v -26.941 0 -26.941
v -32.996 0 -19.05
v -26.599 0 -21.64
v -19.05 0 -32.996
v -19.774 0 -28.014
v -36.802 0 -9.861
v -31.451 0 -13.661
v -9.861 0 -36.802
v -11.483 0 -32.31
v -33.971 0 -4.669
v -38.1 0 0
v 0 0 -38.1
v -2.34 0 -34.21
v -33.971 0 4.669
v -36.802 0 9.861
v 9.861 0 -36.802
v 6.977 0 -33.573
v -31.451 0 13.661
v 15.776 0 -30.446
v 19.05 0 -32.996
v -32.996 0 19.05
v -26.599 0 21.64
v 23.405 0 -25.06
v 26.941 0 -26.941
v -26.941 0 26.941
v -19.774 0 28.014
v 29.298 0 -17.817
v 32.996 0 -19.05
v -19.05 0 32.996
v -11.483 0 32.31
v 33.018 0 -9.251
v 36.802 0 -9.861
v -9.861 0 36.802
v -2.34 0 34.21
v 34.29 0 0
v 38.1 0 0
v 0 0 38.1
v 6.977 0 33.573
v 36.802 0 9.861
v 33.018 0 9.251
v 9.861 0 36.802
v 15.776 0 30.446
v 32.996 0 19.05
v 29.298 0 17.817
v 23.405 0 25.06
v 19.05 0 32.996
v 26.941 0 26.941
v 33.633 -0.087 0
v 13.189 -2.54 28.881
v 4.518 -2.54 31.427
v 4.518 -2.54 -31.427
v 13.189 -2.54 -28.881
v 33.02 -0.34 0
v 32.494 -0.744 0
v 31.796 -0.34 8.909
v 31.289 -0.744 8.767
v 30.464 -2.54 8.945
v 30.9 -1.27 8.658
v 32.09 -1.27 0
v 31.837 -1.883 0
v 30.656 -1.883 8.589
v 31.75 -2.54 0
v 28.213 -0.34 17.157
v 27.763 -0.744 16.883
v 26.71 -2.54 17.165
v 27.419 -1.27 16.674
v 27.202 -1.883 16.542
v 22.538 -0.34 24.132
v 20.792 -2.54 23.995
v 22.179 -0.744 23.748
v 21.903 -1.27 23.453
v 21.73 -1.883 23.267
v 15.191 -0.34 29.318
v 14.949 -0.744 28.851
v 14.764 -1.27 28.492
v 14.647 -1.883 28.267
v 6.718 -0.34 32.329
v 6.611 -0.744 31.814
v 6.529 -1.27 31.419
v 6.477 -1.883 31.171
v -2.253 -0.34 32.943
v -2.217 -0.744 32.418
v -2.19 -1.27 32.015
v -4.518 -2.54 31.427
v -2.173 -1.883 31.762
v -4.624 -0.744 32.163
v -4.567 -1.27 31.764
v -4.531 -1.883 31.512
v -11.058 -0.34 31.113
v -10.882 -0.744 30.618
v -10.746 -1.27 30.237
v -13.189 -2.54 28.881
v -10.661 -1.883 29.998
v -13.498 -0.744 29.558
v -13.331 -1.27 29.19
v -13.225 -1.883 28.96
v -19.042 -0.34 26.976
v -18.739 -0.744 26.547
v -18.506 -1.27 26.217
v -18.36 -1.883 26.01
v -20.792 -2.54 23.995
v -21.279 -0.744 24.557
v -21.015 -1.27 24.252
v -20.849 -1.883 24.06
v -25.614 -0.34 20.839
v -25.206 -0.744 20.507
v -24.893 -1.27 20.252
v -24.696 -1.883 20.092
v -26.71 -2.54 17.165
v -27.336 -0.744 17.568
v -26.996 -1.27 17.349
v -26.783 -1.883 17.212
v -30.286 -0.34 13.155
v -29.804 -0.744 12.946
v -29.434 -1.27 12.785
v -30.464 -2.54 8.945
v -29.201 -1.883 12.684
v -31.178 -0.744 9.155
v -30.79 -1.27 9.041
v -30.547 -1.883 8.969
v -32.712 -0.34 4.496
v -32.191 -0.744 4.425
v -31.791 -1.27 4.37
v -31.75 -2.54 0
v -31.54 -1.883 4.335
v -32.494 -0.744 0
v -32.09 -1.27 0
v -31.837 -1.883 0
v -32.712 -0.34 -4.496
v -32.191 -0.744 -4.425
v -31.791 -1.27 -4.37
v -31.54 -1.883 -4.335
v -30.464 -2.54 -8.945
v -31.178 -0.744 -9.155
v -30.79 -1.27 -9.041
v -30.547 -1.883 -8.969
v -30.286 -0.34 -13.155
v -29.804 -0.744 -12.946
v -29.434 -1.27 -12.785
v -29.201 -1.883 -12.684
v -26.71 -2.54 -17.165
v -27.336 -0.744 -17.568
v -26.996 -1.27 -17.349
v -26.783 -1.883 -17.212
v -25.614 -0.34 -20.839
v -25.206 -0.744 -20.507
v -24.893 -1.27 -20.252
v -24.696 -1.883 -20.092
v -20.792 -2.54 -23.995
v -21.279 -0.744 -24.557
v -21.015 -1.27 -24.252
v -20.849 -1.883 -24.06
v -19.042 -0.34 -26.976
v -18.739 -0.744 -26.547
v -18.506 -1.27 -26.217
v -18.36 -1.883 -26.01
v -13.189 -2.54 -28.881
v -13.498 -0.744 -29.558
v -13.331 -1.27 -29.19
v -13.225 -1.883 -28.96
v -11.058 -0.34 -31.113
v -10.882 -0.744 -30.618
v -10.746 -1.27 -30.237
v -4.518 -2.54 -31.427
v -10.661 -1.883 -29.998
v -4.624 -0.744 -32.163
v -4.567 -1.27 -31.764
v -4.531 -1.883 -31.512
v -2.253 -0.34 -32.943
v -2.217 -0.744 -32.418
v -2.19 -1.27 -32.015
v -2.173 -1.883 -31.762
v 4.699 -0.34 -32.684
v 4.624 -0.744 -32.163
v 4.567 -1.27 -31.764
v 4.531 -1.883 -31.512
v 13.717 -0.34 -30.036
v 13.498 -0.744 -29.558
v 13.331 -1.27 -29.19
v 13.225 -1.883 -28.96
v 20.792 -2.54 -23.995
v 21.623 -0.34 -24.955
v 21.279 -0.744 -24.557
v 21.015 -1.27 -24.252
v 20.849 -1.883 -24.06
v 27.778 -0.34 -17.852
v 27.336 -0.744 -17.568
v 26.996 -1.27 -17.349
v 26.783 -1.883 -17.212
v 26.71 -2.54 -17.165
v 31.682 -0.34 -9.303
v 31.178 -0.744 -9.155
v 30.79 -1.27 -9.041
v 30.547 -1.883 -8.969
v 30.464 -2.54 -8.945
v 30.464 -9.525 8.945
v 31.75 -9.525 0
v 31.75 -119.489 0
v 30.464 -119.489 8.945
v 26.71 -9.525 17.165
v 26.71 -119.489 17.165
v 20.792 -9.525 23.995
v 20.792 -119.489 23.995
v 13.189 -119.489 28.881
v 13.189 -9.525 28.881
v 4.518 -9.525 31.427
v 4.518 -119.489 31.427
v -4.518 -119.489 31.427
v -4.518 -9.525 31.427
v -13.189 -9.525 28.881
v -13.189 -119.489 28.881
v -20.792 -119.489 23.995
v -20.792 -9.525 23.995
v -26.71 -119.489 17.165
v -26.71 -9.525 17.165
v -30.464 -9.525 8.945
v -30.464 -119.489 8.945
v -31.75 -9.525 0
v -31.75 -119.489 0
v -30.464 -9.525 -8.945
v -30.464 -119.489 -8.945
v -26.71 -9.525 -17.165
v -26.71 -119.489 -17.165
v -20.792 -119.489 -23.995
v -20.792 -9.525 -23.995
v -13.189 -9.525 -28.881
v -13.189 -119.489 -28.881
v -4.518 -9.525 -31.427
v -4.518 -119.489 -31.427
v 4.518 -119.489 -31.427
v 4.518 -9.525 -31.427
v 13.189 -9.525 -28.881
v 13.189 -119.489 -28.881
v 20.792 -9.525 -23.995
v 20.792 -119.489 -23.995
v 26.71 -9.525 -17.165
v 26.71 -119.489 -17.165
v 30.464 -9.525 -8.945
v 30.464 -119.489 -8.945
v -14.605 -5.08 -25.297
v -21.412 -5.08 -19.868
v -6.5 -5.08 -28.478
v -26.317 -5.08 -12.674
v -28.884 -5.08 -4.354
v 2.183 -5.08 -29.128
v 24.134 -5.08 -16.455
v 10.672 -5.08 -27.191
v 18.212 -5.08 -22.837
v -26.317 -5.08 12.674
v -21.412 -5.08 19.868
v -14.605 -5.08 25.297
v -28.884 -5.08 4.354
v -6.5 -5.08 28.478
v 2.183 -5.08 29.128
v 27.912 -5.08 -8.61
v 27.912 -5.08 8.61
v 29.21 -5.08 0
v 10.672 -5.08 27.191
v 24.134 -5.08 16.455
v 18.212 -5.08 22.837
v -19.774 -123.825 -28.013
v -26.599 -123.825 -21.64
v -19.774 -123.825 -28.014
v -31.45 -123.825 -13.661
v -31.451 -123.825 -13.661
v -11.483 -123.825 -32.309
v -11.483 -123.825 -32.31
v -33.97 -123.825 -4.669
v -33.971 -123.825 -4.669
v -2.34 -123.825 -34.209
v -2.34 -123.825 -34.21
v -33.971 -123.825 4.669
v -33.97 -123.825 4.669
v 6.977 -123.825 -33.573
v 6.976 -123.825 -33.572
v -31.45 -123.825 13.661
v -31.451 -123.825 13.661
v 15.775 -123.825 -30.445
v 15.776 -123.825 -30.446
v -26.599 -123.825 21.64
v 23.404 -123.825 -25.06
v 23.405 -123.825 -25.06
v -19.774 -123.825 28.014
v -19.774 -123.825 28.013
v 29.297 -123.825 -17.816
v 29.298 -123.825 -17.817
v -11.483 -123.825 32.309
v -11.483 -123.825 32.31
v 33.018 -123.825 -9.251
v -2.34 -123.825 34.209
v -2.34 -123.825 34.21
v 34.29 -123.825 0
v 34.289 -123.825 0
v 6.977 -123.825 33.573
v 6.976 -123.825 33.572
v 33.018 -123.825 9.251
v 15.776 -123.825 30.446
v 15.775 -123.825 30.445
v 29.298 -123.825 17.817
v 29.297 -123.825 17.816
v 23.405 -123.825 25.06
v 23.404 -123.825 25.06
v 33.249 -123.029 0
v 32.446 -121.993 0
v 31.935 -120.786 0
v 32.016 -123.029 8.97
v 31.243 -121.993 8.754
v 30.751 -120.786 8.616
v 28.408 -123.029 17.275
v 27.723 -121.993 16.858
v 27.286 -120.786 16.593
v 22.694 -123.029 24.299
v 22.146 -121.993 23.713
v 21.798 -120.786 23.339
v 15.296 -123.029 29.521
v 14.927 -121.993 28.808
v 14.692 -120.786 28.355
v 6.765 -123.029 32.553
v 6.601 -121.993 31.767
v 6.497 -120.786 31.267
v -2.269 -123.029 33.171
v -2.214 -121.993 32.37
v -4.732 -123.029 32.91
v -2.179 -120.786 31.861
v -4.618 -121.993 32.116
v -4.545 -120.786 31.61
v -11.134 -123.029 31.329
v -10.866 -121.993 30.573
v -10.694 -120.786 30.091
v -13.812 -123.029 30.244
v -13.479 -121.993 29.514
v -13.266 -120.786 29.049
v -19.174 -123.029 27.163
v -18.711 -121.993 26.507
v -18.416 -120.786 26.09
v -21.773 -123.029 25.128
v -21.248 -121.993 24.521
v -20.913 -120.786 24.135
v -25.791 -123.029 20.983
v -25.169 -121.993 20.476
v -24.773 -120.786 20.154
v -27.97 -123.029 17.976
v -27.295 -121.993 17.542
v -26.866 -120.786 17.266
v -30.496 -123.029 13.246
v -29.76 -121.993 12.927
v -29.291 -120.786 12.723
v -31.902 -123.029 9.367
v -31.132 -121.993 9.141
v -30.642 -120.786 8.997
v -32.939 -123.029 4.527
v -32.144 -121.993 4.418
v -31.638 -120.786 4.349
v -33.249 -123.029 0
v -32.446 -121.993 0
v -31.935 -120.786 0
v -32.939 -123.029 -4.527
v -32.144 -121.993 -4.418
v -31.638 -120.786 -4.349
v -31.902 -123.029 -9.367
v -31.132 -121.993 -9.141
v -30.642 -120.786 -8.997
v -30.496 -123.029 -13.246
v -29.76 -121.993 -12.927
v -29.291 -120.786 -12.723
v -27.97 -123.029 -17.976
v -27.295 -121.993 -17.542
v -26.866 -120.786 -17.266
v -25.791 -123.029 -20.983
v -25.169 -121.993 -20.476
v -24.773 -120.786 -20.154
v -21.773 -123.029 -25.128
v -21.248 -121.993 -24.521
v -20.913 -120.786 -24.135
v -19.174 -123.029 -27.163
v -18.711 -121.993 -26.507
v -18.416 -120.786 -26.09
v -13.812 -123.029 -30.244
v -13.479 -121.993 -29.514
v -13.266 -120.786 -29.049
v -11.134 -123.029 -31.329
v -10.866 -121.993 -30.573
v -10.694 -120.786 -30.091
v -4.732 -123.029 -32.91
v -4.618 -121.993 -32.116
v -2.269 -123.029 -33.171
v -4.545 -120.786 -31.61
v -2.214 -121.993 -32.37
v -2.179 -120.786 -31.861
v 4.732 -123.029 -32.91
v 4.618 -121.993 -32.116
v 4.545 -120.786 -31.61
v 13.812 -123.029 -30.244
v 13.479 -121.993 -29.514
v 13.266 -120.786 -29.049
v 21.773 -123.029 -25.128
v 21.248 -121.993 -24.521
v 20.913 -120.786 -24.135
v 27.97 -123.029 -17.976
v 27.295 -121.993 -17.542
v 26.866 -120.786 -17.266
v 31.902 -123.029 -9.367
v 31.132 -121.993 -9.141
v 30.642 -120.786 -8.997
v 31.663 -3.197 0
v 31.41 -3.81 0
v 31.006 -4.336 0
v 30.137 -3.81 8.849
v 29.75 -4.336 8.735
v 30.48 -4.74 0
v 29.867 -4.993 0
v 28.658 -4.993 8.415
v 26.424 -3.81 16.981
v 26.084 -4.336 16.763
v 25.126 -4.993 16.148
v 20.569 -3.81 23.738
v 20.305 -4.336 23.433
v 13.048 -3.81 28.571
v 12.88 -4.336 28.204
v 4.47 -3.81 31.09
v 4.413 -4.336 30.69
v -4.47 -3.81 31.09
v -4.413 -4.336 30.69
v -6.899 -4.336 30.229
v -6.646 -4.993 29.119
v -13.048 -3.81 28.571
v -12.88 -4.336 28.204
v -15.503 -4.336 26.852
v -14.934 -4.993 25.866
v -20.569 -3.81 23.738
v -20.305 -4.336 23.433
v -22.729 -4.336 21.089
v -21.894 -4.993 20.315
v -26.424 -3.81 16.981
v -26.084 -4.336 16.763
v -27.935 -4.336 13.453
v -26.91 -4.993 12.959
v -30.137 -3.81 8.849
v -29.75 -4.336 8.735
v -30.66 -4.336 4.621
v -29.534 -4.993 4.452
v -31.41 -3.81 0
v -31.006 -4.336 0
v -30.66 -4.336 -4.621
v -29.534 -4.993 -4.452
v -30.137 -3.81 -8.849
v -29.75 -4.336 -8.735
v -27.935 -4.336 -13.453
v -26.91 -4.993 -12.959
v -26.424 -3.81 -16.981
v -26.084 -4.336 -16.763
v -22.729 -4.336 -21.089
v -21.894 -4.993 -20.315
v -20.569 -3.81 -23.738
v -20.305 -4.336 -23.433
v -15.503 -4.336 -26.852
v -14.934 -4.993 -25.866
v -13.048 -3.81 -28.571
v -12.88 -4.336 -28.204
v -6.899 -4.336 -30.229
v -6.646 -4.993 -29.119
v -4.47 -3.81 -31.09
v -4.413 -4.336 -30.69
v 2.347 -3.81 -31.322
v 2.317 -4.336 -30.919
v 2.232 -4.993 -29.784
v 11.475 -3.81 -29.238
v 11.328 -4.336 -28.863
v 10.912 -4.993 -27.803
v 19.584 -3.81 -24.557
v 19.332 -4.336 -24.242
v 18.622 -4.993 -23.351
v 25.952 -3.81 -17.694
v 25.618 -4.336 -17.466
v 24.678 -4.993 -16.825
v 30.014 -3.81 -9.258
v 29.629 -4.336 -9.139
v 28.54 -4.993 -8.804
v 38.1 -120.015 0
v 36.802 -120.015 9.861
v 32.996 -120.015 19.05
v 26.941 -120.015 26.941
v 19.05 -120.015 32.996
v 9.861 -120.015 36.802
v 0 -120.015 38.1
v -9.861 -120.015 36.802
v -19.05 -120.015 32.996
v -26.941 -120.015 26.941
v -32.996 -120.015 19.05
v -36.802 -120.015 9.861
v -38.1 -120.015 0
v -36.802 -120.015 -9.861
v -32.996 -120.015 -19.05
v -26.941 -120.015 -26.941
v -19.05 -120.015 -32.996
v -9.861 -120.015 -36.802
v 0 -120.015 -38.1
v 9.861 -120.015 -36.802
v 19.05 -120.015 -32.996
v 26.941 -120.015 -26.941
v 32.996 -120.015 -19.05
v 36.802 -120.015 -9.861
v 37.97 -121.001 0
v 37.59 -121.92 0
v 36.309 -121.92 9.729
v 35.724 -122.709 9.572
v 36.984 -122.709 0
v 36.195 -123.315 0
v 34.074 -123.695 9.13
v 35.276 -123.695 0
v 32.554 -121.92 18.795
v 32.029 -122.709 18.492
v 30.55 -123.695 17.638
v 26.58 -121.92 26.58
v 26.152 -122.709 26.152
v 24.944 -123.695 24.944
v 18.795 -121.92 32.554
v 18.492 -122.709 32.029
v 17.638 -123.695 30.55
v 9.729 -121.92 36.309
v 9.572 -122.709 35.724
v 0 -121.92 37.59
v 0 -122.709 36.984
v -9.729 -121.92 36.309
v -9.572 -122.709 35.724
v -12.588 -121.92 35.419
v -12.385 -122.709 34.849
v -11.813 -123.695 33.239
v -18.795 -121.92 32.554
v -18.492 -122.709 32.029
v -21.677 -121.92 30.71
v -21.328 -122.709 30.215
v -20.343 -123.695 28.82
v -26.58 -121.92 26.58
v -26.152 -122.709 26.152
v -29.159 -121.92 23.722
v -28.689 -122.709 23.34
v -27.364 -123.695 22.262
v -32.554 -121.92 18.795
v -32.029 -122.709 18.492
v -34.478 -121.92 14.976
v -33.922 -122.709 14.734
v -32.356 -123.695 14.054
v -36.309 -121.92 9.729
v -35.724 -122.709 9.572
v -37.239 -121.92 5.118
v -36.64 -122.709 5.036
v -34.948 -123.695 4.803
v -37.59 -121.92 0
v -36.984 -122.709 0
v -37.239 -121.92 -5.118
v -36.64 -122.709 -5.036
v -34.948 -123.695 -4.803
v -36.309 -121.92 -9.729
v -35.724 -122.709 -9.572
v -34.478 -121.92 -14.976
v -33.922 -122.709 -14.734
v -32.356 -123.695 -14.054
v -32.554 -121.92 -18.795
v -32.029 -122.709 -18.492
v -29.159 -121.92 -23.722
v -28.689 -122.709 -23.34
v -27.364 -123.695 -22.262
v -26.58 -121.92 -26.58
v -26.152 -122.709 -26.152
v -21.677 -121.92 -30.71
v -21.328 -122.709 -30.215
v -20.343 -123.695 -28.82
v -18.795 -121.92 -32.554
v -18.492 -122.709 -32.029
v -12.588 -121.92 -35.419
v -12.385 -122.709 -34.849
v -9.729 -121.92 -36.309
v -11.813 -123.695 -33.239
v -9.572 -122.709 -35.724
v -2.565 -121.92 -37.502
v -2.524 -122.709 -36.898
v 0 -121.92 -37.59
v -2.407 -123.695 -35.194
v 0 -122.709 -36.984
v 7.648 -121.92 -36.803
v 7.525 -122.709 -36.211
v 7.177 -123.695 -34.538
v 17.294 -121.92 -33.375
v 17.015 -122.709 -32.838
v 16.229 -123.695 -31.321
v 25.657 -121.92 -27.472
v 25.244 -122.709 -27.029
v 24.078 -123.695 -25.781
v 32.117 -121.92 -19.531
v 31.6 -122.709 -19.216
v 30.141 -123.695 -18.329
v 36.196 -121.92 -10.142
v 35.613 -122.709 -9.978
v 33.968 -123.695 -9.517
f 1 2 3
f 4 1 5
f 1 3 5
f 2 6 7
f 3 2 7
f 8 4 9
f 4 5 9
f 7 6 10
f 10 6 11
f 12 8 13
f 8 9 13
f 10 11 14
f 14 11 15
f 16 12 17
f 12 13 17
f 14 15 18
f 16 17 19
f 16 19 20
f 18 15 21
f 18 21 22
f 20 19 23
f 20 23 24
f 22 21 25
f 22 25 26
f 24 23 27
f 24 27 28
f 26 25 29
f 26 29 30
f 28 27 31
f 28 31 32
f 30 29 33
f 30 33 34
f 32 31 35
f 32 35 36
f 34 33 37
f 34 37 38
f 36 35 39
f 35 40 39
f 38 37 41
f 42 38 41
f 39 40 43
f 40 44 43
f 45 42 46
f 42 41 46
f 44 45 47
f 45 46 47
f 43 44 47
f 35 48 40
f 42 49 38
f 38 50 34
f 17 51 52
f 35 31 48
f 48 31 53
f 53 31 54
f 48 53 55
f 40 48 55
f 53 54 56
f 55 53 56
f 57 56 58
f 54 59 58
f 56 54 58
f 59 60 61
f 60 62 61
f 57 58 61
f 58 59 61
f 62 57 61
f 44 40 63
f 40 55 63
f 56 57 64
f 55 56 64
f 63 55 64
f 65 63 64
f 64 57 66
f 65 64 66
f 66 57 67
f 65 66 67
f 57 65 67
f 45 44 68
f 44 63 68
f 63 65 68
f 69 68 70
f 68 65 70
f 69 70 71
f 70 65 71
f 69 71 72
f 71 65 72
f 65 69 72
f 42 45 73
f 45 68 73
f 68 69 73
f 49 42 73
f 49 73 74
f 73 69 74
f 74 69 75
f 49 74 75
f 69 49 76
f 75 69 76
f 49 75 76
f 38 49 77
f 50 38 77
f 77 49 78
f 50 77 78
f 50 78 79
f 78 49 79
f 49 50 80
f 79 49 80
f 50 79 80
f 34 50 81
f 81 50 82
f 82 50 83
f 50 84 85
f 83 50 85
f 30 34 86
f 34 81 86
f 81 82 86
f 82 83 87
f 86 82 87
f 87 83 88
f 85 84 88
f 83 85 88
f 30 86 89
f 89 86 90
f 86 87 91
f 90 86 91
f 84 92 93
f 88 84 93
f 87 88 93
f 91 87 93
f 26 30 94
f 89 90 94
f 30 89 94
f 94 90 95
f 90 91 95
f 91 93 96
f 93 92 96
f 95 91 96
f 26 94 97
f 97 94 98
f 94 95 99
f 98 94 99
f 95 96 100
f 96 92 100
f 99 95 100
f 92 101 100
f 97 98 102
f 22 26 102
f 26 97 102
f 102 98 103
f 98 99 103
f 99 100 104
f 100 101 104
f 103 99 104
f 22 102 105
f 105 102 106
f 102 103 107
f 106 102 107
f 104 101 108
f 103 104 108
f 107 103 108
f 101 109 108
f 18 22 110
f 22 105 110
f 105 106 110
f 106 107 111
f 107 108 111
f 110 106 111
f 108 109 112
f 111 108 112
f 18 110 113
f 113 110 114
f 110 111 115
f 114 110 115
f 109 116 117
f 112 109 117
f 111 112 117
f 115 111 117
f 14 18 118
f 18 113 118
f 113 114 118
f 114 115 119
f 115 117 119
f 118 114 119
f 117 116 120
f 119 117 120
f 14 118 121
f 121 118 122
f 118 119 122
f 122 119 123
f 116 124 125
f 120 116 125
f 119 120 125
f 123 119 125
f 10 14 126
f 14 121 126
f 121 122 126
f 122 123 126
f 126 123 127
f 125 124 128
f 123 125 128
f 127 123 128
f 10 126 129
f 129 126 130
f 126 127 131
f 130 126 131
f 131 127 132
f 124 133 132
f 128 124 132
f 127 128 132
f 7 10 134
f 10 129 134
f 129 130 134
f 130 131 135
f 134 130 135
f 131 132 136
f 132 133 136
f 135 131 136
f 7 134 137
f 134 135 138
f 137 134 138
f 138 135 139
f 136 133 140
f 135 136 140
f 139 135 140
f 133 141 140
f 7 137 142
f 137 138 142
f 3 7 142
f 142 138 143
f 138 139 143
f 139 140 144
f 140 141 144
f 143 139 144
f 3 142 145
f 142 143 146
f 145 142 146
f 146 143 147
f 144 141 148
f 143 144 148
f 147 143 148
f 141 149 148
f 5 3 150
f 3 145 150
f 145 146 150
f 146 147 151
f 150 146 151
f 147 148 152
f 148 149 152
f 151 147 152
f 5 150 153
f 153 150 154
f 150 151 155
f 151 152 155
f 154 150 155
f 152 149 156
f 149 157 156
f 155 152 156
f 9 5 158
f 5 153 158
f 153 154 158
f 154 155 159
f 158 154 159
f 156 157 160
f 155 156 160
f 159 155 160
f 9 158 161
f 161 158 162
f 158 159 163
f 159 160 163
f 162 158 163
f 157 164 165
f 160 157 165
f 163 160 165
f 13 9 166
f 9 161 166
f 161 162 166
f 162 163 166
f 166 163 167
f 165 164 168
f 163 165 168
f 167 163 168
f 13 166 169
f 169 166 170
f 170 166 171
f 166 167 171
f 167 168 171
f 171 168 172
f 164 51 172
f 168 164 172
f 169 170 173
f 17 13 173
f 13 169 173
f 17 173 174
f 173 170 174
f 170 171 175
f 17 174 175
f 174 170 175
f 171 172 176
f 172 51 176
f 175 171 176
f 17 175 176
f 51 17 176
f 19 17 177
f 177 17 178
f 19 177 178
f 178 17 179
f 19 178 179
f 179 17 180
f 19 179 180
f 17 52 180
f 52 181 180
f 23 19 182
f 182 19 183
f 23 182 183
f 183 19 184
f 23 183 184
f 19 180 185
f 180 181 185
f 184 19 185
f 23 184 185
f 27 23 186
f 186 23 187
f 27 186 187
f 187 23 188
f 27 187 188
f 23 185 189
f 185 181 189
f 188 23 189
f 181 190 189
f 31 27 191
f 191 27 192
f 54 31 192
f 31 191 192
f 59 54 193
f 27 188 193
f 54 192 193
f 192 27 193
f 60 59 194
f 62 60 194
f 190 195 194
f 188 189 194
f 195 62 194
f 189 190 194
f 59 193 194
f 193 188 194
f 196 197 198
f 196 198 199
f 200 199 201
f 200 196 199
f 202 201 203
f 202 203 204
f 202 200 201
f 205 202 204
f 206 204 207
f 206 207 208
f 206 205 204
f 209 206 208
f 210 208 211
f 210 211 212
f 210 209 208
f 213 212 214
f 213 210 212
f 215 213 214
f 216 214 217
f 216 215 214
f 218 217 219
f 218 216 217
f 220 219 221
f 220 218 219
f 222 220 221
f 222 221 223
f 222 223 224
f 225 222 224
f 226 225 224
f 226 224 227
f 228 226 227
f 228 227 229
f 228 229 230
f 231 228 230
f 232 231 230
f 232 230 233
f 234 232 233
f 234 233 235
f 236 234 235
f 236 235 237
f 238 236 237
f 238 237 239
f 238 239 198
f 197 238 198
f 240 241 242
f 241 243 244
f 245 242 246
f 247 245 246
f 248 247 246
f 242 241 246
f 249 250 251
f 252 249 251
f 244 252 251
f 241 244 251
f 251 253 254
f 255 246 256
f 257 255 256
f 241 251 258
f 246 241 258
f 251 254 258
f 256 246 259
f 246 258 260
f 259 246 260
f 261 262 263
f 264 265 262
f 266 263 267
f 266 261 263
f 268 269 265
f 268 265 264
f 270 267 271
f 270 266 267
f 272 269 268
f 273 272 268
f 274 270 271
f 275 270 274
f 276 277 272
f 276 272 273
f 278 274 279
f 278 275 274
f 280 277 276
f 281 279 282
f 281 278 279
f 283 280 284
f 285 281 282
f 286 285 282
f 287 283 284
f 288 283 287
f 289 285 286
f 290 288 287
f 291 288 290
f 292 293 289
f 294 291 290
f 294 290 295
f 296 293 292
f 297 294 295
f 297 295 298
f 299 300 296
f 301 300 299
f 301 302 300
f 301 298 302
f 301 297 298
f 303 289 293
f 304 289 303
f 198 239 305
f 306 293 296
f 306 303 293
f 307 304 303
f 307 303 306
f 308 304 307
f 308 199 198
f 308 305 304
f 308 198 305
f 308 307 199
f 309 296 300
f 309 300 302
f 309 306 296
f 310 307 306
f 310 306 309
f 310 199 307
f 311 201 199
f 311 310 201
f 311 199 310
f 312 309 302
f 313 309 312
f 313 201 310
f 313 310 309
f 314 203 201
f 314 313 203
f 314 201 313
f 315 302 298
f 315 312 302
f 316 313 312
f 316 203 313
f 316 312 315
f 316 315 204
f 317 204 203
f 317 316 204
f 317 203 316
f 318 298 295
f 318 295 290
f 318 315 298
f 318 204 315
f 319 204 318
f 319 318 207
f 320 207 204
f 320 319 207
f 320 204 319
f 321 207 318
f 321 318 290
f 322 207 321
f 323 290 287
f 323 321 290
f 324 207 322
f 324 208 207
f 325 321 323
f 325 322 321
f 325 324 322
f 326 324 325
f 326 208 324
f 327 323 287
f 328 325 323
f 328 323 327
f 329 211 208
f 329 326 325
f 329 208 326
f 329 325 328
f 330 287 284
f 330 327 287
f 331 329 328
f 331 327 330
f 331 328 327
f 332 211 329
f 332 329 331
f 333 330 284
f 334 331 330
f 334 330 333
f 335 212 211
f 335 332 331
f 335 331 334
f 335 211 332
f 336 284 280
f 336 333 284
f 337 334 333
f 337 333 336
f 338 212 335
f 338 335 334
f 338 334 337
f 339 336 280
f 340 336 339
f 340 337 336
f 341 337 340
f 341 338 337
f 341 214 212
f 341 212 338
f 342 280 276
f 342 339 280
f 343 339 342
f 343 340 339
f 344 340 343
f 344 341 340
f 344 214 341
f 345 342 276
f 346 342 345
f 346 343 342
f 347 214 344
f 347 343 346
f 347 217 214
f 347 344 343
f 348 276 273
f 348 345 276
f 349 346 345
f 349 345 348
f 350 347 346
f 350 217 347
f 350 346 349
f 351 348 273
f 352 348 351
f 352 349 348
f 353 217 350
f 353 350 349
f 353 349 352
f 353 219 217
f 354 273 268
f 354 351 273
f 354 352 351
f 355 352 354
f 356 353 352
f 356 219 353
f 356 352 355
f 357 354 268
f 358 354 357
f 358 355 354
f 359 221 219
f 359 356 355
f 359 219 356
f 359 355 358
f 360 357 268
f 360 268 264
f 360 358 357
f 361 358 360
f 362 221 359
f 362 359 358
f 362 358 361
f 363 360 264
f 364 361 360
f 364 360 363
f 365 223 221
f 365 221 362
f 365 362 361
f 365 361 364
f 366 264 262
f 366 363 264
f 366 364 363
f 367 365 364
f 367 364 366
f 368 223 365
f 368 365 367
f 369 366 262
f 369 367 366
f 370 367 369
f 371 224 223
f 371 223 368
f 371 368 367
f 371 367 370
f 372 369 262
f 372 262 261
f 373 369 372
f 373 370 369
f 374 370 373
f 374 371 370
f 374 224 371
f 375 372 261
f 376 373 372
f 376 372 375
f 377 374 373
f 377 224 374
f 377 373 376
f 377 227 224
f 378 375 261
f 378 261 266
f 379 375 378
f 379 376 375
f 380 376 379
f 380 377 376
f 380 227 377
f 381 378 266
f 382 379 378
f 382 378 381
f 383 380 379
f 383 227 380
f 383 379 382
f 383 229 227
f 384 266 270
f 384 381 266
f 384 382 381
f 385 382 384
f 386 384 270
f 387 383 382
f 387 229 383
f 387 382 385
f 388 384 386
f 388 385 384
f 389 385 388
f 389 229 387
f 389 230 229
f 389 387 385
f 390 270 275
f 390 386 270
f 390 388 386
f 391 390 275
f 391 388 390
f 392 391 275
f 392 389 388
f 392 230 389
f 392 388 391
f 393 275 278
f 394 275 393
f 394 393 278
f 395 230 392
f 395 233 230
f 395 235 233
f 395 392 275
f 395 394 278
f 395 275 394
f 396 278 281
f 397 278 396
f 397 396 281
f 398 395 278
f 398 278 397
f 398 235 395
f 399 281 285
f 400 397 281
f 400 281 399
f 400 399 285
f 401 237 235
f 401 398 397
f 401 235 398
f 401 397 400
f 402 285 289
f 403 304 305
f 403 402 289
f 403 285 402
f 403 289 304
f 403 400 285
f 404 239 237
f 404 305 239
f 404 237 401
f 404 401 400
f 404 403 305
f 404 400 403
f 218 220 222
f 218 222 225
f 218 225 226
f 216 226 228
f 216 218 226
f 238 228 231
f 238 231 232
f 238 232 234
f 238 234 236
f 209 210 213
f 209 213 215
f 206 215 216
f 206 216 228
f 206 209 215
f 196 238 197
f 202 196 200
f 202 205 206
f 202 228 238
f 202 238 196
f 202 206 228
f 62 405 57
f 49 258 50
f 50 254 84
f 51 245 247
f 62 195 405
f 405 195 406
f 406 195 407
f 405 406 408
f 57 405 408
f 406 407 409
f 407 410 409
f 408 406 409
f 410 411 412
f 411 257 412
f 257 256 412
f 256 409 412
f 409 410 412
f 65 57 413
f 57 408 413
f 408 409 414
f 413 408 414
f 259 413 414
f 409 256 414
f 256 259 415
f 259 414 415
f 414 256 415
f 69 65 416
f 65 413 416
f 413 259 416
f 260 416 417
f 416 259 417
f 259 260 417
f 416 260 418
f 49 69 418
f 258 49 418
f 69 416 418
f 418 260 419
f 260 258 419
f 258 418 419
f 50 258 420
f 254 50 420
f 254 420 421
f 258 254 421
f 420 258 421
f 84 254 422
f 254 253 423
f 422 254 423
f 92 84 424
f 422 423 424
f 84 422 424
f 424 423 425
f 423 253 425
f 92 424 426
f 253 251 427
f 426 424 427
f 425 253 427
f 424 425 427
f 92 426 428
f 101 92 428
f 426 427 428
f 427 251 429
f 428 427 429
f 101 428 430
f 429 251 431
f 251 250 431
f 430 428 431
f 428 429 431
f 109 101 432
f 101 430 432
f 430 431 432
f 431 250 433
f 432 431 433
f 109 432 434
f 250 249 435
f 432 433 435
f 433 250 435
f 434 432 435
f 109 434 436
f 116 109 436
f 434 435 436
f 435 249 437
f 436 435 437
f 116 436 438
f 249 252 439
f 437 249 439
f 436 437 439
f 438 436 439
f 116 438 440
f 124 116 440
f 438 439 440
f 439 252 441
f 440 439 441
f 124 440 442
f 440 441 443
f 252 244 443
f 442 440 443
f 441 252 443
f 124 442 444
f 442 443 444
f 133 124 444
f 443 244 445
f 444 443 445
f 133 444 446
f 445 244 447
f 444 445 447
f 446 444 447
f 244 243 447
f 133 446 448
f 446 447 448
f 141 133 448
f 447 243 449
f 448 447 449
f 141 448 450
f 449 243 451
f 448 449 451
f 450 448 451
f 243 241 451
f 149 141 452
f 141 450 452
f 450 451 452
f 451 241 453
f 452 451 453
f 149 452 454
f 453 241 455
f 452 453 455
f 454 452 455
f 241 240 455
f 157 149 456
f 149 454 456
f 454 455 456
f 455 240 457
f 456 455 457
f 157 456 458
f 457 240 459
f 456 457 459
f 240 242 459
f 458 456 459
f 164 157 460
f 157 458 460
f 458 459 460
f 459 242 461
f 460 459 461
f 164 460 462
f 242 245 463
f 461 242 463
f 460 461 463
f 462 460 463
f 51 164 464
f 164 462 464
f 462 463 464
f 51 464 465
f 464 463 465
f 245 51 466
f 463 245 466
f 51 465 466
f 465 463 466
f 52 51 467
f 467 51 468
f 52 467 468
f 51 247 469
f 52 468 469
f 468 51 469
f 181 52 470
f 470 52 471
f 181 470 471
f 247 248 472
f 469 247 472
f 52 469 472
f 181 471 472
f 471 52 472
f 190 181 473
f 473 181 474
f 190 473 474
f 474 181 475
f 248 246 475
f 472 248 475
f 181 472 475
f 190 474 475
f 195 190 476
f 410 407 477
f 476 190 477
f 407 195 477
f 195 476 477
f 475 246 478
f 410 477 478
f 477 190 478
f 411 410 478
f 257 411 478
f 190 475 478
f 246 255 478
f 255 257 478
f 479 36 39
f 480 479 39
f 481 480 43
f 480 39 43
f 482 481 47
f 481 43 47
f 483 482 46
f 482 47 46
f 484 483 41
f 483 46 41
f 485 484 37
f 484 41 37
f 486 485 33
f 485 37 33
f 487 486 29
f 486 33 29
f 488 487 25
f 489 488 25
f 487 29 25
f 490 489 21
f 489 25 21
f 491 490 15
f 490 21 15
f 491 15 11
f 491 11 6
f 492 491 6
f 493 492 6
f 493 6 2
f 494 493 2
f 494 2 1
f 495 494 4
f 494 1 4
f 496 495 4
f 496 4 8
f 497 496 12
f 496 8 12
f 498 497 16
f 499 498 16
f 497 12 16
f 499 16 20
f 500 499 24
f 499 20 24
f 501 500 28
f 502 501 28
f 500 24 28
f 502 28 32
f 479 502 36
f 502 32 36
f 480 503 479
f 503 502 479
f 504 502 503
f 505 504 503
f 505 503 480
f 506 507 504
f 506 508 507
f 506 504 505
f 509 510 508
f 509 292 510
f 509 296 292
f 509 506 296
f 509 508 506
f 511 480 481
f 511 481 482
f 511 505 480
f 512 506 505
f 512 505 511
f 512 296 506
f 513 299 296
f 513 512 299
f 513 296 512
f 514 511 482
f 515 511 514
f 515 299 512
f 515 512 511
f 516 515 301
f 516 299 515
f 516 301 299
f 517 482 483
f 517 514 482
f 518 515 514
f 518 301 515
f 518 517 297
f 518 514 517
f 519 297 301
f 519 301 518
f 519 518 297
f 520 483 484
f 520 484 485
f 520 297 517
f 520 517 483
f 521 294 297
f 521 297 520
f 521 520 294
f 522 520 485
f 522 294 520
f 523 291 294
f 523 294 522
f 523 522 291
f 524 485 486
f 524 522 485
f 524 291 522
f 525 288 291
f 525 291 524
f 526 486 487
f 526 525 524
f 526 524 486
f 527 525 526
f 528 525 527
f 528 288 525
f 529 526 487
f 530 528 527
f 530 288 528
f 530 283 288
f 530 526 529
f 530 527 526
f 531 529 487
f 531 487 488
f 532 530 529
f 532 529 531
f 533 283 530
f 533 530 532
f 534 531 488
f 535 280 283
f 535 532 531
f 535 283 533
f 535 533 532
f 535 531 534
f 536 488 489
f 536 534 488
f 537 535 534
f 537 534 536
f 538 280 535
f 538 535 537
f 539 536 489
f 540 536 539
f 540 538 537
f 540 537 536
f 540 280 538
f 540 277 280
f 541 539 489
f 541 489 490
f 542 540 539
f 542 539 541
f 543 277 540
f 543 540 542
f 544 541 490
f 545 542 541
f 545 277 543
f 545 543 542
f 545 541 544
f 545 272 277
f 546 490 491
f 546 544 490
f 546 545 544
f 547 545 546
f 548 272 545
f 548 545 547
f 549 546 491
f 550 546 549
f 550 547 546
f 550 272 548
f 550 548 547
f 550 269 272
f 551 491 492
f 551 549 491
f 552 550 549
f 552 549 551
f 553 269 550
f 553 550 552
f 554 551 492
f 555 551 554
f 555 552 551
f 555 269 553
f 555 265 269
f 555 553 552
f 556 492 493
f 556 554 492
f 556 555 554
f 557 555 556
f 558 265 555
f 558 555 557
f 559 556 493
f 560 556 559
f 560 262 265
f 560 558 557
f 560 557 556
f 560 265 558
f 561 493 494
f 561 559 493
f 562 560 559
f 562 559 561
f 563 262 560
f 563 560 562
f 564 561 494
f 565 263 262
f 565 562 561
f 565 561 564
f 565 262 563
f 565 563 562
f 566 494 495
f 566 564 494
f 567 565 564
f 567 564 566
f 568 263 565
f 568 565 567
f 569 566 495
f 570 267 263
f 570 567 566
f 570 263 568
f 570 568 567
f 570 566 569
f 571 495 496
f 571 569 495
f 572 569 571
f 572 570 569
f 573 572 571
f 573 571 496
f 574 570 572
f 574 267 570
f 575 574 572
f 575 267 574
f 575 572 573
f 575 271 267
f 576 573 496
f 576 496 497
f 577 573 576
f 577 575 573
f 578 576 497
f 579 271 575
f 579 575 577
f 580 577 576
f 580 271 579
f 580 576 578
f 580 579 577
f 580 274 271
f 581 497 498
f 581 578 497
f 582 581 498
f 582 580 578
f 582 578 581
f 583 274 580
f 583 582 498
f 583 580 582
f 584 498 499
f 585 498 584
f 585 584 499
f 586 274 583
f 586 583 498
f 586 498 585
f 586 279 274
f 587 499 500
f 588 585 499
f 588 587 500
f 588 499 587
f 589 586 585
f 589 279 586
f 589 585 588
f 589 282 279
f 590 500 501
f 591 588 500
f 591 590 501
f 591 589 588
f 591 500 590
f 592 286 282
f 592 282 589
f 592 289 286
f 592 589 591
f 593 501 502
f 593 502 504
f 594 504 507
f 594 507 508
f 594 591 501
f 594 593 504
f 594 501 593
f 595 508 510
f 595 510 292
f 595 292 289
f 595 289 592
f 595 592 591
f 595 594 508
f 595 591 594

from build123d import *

# Parameters (mm, degrees)
F0_R     = 38.1
F0_R_2   = 31.75
F1_DEPTH = 123.825
F2_DEPTH = 9.525
F3_R     = 3.81
F5_DEPTH = 5.08
F6_R     = 2.53999


# Not quite as in the source:
# - a fillet or chamfer that OpenCascade refuses, or shapes differently, is made with other operations: its cross-section is extruded or revolved along the edge and cut away or added
# - a fillet or chamfer is up to 0.001 mm smaller than in the source, because OpenCascade refuses the exact size


with BuildPart() as f1:
    # F0 (on Front) → F1 (new body)
    with BuildSketch(Plane.XZ):
        Circle(F0_R)
        Circle(F0_R_2, mode=Mode.SUBTRACT)
    extrude(amount=F1_DEPTH)

    # F0 (on Front) → F2 (join)
    with BuildSketch(Plane.XZ):
        Circle(F0_R_2)
    extrude(amount=F2_DEPTH)

    # F3
    f3_edges = [f1.edges().sort_by_distance(p)[0] for p in [
        (-38.1, -123.825, 0),
    ]]
    fillet(f3_edges, radius=F3_R)

    # F4: fillet of radius 5.08 on 1 edges, made by hand

    # F4_s1 → F4_t2 (revolve, cut)
    with BuildSketch(Plane.XY):
        with BuildLine():
            ThreePointArc((34.289799962, -123.8253463882), (32.4302345225, -121.9654748362), (31.7496, -119.4250334454))
            Line((31.7496, -119.4250334454), (31.2414634315, -119.4250334454))
            ThreePointArc((31.2414634315, -119.4250334454), (31.2418634315, -121.6250167227), (31.2418634315, -123.825))
            Line((31.2418634315, -123.825), (31.75, -124.3331365685))
            ThreePointArc((31.75, -124.3331365685), (33.019899981, -124.3331365685), (34.0356833896, -124.2653776825))
            Line((34.0356833896, -124.2653776825), (34.289799962, -123.8253463882))
        make_face()
    revolve(axis=Axis((0, -123.825, 0), (0, -1, 0)), mode=Mode.SUBTRACT)

    # F0 (on Front) → F5 (cut)
    with BuildSketch(Plane.XZ):
        Circle(F0_R_2)
    extrude(amount=F5_DEPTH, mode=Mode.SUBTRACT)

    # F6 (radius 2.54 in the source; OpenCascade refuses exactly that, so slightly less here)
    f6_edges = [f1.edges().sort_by_distance(p)[0] for p in [
        (-31.75, -5.08, 0),
        (-31.75, 0, 0),
    ]]
    fillet(f6_edges, radius=F6_R)


solid = f1.part
